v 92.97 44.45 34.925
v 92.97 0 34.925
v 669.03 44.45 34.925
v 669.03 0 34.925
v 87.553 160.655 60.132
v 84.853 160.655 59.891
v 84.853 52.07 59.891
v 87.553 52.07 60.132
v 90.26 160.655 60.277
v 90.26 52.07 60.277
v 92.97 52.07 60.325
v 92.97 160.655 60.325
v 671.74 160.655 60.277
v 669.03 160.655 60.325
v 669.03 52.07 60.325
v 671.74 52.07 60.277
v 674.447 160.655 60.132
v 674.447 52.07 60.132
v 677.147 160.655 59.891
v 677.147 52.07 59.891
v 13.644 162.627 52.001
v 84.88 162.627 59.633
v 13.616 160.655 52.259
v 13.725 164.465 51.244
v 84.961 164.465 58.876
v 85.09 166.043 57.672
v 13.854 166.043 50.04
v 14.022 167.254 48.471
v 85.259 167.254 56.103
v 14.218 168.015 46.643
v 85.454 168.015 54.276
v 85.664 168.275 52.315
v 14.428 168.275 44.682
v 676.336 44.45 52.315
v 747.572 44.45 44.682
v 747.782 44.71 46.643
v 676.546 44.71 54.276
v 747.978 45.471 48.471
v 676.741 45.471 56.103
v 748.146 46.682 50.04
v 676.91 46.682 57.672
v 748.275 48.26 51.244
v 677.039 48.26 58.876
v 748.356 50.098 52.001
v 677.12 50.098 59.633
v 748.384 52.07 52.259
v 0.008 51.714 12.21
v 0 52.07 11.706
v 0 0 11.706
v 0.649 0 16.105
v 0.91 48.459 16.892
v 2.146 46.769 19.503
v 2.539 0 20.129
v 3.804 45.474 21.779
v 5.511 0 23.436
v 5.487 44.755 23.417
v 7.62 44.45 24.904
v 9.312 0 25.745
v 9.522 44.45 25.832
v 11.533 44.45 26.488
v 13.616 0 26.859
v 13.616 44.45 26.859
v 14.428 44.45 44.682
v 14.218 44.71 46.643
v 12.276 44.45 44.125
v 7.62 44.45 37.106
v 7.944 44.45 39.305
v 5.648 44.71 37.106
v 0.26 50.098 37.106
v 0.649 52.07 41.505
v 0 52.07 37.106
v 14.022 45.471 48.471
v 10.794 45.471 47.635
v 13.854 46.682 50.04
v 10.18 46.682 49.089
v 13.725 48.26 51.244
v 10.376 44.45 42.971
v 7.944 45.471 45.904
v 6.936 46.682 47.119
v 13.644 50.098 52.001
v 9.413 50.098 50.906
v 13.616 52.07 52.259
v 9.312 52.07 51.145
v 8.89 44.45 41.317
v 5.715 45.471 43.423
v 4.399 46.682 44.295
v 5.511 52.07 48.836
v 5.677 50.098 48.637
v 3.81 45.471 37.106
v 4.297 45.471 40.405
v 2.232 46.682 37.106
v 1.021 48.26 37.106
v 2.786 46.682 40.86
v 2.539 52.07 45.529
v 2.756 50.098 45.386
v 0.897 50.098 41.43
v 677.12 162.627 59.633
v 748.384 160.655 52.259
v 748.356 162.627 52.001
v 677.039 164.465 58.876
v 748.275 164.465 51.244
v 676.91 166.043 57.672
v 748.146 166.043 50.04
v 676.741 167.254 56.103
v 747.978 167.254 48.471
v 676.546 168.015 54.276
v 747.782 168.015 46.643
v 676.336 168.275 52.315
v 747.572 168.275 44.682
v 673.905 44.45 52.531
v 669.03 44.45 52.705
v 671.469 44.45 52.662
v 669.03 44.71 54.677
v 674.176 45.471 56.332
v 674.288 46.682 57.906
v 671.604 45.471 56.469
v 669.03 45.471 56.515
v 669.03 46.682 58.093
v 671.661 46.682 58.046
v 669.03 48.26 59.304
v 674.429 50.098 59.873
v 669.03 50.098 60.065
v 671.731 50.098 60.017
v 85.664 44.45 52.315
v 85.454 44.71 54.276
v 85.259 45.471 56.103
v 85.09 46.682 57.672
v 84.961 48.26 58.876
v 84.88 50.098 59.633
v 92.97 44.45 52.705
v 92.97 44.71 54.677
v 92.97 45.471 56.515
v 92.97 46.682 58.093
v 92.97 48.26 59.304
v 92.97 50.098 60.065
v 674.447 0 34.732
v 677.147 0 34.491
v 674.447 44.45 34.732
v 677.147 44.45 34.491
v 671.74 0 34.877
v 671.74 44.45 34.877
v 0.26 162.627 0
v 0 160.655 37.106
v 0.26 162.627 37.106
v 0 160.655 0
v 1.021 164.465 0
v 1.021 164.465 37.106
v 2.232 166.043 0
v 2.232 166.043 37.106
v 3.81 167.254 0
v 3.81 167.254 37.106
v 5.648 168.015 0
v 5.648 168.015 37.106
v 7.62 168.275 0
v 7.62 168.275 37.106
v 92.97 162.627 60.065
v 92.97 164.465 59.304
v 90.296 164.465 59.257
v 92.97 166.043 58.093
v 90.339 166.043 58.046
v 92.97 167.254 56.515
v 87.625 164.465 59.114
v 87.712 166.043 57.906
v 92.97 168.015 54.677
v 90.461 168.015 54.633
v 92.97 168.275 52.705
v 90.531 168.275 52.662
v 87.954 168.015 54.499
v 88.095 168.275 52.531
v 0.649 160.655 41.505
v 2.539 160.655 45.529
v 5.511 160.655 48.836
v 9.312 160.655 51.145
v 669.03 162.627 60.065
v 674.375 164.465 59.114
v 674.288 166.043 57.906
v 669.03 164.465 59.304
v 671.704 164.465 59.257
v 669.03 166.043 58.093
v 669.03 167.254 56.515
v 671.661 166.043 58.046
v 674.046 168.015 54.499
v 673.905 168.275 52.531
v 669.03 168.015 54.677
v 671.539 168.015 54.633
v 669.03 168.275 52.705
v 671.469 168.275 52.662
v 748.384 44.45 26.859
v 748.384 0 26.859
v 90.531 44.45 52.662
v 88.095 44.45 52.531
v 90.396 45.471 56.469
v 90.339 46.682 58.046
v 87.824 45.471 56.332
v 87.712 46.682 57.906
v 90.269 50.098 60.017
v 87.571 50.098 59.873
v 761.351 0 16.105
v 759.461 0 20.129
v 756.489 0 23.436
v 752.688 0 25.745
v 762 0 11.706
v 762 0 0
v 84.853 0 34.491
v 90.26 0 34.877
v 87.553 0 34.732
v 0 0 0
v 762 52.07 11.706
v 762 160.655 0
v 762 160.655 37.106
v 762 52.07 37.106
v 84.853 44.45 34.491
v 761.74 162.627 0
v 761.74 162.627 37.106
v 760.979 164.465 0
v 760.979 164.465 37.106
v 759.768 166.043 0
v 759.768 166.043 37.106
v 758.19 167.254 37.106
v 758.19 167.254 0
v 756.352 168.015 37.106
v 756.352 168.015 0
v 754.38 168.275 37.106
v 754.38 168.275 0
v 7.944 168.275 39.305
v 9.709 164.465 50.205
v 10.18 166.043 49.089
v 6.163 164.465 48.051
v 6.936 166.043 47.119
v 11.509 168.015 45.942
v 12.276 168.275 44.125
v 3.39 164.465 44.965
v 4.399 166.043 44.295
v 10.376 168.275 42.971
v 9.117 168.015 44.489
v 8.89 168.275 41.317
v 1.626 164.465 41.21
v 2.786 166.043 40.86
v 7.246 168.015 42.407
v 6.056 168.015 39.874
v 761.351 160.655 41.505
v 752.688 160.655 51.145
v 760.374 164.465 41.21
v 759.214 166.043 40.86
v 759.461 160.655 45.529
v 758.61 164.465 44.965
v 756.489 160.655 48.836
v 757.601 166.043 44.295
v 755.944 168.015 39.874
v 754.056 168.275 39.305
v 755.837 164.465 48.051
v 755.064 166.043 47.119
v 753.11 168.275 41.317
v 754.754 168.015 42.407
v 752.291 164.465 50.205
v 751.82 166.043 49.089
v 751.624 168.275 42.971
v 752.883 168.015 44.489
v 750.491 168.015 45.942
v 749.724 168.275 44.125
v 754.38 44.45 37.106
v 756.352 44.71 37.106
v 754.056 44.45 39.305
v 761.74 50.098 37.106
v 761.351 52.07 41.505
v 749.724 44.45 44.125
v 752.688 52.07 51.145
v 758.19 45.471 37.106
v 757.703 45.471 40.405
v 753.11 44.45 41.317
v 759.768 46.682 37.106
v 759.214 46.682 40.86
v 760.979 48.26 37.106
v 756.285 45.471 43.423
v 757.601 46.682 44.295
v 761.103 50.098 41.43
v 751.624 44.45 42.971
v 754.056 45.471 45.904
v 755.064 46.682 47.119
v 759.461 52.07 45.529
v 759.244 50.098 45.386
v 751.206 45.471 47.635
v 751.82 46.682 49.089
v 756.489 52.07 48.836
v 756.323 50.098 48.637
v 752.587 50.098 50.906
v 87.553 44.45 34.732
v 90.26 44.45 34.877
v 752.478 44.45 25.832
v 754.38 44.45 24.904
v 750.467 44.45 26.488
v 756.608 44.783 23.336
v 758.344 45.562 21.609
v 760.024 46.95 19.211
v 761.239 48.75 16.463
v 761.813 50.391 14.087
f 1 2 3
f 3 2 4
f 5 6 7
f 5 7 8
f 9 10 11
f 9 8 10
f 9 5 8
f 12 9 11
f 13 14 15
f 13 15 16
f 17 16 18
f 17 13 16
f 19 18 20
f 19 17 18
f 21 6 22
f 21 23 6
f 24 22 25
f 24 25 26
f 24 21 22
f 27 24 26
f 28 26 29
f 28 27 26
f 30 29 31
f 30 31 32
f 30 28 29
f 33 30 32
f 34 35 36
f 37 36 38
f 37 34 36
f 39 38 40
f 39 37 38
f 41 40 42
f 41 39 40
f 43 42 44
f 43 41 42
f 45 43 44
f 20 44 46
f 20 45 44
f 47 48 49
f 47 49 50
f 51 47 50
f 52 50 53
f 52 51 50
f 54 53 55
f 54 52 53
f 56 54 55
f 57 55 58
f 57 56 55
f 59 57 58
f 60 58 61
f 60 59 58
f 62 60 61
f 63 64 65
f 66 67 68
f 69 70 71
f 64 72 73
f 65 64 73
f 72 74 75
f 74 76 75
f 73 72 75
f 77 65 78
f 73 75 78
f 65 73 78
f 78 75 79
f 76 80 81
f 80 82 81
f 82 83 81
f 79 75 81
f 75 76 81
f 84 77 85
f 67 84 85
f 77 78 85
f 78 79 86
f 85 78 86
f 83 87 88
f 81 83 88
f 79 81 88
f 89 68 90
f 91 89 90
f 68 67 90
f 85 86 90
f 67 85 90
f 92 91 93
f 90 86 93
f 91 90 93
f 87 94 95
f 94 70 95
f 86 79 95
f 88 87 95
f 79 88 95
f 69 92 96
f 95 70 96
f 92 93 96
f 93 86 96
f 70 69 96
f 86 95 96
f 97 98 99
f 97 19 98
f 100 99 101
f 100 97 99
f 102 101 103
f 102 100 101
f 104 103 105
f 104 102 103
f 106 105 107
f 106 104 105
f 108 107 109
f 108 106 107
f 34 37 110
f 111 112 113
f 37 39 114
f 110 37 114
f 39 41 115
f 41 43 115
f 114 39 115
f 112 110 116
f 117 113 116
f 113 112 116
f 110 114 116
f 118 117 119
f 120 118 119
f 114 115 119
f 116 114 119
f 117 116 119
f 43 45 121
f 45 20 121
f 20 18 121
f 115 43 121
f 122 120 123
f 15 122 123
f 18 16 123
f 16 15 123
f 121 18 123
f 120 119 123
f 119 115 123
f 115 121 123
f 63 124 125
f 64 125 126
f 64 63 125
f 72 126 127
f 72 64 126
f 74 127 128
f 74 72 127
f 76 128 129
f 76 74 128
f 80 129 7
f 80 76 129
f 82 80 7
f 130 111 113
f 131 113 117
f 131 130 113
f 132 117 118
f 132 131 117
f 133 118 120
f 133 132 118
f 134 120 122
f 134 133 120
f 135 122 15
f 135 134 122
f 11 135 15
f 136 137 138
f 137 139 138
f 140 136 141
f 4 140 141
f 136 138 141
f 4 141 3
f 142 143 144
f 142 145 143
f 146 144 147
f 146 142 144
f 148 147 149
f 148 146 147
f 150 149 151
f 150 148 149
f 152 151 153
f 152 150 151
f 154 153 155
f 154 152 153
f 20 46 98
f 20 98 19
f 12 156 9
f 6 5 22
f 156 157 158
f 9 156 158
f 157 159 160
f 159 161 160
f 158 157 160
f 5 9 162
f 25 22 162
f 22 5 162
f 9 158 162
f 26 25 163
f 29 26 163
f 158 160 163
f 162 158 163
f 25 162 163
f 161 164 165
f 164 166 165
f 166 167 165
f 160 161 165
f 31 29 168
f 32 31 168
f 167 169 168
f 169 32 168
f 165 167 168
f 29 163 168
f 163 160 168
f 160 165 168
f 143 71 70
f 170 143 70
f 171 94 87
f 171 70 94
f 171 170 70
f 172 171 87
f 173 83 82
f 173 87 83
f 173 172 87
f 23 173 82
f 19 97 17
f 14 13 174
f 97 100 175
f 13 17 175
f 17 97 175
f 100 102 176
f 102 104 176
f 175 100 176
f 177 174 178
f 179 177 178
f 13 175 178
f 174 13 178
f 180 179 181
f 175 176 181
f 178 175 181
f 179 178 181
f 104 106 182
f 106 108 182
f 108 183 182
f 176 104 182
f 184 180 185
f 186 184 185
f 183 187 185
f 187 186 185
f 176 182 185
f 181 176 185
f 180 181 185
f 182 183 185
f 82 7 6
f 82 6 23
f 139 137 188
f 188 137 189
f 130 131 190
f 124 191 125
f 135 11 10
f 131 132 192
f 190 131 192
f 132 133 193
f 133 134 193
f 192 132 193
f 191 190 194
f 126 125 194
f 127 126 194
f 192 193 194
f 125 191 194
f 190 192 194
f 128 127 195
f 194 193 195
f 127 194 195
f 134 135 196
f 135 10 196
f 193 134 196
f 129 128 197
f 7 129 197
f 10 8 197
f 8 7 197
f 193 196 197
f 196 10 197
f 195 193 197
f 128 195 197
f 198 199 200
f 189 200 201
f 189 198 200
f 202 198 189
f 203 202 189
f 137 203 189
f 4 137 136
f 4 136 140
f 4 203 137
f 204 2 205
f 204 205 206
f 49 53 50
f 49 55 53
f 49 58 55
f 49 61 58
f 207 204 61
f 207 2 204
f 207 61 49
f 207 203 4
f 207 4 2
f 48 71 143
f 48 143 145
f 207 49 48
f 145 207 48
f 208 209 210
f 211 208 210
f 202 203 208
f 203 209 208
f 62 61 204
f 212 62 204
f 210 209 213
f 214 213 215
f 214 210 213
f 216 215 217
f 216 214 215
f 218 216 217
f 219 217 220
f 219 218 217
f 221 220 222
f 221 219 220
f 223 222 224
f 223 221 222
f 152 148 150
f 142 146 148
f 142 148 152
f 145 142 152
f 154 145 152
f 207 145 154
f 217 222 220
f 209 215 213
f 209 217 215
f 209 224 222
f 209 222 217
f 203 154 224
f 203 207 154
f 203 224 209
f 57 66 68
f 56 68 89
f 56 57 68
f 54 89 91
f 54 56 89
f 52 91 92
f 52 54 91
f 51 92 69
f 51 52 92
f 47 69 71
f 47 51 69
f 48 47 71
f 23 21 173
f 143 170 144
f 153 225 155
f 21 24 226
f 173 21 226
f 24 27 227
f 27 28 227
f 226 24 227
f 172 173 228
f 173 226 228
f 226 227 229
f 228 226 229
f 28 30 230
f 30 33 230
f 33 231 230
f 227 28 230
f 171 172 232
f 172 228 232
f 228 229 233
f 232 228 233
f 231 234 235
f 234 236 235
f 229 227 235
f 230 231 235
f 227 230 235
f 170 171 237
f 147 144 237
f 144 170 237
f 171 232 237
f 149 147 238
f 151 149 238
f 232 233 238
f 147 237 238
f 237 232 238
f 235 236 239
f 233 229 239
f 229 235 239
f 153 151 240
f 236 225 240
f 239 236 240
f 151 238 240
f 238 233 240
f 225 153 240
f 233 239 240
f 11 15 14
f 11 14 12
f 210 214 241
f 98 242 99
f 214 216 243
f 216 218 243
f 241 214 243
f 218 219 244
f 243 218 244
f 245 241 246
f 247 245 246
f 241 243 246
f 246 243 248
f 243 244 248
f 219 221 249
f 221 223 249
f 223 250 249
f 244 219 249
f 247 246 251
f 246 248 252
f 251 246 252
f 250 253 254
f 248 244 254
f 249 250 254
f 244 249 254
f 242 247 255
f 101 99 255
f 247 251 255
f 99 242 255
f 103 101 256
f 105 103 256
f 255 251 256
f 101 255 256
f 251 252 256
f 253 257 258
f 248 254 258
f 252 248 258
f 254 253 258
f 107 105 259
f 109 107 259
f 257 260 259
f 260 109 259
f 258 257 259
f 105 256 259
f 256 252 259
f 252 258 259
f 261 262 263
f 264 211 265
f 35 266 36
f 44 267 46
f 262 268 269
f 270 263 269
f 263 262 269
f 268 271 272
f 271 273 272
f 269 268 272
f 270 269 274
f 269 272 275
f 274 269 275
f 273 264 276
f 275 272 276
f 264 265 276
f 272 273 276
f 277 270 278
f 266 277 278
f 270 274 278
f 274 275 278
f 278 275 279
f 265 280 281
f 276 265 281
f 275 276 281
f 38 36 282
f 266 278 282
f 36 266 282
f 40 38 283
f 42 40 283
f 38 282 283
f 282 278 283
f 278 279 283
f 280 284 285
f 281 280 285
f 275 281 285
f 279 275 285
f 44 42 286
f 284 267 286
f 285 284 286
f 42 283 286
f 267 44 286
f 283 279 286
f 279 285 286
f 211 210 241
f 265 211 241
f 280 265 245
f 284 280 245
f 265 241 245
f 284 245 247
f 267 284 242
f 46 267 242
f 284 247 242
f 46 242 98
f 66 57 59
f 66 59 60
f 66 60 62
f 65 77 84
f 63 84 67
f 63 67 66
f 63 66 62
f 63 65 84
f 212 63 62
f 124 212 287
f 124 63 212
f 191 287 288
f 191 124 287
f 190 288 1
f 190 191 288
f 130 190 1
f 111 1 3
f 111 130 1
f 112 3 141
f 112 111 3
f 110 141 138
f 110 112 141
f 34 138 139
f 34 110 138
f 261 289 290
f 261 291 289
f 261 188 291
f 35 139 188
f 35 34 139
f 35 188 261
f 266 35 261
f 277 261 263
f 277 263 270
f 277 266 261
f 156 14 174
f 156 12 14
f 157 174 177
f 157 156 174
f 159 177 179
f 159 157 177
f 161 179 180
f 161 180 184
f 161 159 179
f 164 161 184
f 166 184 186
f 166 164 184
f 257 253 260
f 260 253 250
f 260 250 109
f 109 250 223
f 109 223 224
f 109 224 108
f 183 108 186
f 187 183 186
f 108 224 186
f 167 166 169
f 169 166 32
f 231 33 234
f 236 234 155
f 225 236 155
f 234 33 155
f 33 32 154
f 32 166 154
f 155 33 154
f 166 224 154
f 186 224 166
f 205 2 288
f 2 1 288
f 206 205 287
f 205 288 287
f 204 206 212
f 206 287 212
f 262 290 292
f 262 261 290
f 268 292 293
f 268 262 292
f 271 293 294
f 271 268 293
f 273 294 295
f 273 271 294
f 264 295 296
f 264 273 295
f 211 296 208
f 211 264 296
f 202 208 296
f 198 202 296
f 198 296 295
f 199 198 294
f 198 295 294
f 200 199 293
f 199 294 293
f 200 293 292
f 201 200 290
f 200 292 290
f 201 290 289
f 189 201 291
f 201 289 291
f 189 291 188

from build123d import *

# Parameters (mm, degrees)
BOSS_EXTRUDE1_DEPTH = 168.275
CUT_EXTRUDE1_DEPTH  = 44.45
FILLET1_R           = 15.24
FILLET2_R           = 76.2
FILLET3_R           = 7.62
FILLET4_R           = 7.62


with BuildPart() as part:
    # Sketch7 → Boss-Extrude1 (new body)
    with BuildSketch(Plane(origin=(0, 0, 0), x_dir=(1, 0, 0), z_dir=(0, 1, 0))):
        Polygon((0, 0), (762, 0), (762, -50.8), (673.1, -60.325), (88.9, -60.325), (0, -50.8), align=None)
    extrude(amount=BOSS_EXTRUDE1_DEPTH)

    # Sketch10 → Cut-Extrude1 (cut)
    with BuildSketch(Plane.XZ):
        Polygon((0, 50.8), (0, 25.4), (88.9, 34.925), (673.1, 34.925), (762, 25.4), (762, 50.8), (673.1, 60.325), (88.9, 60.325), align=None)
    extrude(amount=-CUT_EXTRUDE1_DEPTH, mode=Mode.SUBTRACT)

    # Fillet1
    fillet1_edges = [part.edges().sort_by_distance(p)[0] for p in [
        (762, 106.3625, 50.8),
        (0, 106.3625, 50.8),
        (762, 22.225, 25.4),
        (0, 22.225, 25.4),
    ]]
    fillet(fillet1_edges, radius=FILLET1_R)

    # Fillet2
    fillet2_edges = [part.edges().sort_by_distance(p)[0] for p in [
        (673.1, 106.3625, 60.325),
        (88.9, 106.3625, 60.325),
        (673.1, 22.225, 34.925),
        (88.9, 22.225, 34.925),
    ]]
    fillet(fillet2_edges, radius=FILLET2_R)

    # Fillet3
    fillet3_edges = [part.edges().sort_by_distance(p)[0] for p in [
        (762, 168.275, 18.552816133),
        (0, 168.275, 18.552816133),
        (49.234552732, 168.275, 56.07513065),
        (3.904199904, 168.275, 47.291761863),
        (758.095800096, 168.275, 47.291761863),
        (712.765447268, 168.275, 56.07513065),
        (381, 168.275, 60.325),
        (88.905795265, 168.275, 60.216512154),
        (673.094204735, 168.275, 60.216512154),
    ]]
    fillet(fillet3_edges, radius=FILLET3_R)

    # Fillet4
    fillet4_edges = [part.edges().sort_by_distance(p)[0] for p in [
        (762, 44.45, 18.552816133),
        (0, 44.45, 18.552816133),
        (712.765447268, 44.45, 56.07513065),
        (3.904199904, 44.45, 47.291761863),
        (758.095800096, 44.45, 47.291761863),
        (381, 44.45, 60.325),
        (49.234552732, 44.45, 56.07513065),
        (88.905795265, 44.45, 60.216512154),
        (673.094204735, 44.45, 60.216512154),
    ]]
    fillet(fillet4_edges, radius=FILLET4_R)


solid = part.part
